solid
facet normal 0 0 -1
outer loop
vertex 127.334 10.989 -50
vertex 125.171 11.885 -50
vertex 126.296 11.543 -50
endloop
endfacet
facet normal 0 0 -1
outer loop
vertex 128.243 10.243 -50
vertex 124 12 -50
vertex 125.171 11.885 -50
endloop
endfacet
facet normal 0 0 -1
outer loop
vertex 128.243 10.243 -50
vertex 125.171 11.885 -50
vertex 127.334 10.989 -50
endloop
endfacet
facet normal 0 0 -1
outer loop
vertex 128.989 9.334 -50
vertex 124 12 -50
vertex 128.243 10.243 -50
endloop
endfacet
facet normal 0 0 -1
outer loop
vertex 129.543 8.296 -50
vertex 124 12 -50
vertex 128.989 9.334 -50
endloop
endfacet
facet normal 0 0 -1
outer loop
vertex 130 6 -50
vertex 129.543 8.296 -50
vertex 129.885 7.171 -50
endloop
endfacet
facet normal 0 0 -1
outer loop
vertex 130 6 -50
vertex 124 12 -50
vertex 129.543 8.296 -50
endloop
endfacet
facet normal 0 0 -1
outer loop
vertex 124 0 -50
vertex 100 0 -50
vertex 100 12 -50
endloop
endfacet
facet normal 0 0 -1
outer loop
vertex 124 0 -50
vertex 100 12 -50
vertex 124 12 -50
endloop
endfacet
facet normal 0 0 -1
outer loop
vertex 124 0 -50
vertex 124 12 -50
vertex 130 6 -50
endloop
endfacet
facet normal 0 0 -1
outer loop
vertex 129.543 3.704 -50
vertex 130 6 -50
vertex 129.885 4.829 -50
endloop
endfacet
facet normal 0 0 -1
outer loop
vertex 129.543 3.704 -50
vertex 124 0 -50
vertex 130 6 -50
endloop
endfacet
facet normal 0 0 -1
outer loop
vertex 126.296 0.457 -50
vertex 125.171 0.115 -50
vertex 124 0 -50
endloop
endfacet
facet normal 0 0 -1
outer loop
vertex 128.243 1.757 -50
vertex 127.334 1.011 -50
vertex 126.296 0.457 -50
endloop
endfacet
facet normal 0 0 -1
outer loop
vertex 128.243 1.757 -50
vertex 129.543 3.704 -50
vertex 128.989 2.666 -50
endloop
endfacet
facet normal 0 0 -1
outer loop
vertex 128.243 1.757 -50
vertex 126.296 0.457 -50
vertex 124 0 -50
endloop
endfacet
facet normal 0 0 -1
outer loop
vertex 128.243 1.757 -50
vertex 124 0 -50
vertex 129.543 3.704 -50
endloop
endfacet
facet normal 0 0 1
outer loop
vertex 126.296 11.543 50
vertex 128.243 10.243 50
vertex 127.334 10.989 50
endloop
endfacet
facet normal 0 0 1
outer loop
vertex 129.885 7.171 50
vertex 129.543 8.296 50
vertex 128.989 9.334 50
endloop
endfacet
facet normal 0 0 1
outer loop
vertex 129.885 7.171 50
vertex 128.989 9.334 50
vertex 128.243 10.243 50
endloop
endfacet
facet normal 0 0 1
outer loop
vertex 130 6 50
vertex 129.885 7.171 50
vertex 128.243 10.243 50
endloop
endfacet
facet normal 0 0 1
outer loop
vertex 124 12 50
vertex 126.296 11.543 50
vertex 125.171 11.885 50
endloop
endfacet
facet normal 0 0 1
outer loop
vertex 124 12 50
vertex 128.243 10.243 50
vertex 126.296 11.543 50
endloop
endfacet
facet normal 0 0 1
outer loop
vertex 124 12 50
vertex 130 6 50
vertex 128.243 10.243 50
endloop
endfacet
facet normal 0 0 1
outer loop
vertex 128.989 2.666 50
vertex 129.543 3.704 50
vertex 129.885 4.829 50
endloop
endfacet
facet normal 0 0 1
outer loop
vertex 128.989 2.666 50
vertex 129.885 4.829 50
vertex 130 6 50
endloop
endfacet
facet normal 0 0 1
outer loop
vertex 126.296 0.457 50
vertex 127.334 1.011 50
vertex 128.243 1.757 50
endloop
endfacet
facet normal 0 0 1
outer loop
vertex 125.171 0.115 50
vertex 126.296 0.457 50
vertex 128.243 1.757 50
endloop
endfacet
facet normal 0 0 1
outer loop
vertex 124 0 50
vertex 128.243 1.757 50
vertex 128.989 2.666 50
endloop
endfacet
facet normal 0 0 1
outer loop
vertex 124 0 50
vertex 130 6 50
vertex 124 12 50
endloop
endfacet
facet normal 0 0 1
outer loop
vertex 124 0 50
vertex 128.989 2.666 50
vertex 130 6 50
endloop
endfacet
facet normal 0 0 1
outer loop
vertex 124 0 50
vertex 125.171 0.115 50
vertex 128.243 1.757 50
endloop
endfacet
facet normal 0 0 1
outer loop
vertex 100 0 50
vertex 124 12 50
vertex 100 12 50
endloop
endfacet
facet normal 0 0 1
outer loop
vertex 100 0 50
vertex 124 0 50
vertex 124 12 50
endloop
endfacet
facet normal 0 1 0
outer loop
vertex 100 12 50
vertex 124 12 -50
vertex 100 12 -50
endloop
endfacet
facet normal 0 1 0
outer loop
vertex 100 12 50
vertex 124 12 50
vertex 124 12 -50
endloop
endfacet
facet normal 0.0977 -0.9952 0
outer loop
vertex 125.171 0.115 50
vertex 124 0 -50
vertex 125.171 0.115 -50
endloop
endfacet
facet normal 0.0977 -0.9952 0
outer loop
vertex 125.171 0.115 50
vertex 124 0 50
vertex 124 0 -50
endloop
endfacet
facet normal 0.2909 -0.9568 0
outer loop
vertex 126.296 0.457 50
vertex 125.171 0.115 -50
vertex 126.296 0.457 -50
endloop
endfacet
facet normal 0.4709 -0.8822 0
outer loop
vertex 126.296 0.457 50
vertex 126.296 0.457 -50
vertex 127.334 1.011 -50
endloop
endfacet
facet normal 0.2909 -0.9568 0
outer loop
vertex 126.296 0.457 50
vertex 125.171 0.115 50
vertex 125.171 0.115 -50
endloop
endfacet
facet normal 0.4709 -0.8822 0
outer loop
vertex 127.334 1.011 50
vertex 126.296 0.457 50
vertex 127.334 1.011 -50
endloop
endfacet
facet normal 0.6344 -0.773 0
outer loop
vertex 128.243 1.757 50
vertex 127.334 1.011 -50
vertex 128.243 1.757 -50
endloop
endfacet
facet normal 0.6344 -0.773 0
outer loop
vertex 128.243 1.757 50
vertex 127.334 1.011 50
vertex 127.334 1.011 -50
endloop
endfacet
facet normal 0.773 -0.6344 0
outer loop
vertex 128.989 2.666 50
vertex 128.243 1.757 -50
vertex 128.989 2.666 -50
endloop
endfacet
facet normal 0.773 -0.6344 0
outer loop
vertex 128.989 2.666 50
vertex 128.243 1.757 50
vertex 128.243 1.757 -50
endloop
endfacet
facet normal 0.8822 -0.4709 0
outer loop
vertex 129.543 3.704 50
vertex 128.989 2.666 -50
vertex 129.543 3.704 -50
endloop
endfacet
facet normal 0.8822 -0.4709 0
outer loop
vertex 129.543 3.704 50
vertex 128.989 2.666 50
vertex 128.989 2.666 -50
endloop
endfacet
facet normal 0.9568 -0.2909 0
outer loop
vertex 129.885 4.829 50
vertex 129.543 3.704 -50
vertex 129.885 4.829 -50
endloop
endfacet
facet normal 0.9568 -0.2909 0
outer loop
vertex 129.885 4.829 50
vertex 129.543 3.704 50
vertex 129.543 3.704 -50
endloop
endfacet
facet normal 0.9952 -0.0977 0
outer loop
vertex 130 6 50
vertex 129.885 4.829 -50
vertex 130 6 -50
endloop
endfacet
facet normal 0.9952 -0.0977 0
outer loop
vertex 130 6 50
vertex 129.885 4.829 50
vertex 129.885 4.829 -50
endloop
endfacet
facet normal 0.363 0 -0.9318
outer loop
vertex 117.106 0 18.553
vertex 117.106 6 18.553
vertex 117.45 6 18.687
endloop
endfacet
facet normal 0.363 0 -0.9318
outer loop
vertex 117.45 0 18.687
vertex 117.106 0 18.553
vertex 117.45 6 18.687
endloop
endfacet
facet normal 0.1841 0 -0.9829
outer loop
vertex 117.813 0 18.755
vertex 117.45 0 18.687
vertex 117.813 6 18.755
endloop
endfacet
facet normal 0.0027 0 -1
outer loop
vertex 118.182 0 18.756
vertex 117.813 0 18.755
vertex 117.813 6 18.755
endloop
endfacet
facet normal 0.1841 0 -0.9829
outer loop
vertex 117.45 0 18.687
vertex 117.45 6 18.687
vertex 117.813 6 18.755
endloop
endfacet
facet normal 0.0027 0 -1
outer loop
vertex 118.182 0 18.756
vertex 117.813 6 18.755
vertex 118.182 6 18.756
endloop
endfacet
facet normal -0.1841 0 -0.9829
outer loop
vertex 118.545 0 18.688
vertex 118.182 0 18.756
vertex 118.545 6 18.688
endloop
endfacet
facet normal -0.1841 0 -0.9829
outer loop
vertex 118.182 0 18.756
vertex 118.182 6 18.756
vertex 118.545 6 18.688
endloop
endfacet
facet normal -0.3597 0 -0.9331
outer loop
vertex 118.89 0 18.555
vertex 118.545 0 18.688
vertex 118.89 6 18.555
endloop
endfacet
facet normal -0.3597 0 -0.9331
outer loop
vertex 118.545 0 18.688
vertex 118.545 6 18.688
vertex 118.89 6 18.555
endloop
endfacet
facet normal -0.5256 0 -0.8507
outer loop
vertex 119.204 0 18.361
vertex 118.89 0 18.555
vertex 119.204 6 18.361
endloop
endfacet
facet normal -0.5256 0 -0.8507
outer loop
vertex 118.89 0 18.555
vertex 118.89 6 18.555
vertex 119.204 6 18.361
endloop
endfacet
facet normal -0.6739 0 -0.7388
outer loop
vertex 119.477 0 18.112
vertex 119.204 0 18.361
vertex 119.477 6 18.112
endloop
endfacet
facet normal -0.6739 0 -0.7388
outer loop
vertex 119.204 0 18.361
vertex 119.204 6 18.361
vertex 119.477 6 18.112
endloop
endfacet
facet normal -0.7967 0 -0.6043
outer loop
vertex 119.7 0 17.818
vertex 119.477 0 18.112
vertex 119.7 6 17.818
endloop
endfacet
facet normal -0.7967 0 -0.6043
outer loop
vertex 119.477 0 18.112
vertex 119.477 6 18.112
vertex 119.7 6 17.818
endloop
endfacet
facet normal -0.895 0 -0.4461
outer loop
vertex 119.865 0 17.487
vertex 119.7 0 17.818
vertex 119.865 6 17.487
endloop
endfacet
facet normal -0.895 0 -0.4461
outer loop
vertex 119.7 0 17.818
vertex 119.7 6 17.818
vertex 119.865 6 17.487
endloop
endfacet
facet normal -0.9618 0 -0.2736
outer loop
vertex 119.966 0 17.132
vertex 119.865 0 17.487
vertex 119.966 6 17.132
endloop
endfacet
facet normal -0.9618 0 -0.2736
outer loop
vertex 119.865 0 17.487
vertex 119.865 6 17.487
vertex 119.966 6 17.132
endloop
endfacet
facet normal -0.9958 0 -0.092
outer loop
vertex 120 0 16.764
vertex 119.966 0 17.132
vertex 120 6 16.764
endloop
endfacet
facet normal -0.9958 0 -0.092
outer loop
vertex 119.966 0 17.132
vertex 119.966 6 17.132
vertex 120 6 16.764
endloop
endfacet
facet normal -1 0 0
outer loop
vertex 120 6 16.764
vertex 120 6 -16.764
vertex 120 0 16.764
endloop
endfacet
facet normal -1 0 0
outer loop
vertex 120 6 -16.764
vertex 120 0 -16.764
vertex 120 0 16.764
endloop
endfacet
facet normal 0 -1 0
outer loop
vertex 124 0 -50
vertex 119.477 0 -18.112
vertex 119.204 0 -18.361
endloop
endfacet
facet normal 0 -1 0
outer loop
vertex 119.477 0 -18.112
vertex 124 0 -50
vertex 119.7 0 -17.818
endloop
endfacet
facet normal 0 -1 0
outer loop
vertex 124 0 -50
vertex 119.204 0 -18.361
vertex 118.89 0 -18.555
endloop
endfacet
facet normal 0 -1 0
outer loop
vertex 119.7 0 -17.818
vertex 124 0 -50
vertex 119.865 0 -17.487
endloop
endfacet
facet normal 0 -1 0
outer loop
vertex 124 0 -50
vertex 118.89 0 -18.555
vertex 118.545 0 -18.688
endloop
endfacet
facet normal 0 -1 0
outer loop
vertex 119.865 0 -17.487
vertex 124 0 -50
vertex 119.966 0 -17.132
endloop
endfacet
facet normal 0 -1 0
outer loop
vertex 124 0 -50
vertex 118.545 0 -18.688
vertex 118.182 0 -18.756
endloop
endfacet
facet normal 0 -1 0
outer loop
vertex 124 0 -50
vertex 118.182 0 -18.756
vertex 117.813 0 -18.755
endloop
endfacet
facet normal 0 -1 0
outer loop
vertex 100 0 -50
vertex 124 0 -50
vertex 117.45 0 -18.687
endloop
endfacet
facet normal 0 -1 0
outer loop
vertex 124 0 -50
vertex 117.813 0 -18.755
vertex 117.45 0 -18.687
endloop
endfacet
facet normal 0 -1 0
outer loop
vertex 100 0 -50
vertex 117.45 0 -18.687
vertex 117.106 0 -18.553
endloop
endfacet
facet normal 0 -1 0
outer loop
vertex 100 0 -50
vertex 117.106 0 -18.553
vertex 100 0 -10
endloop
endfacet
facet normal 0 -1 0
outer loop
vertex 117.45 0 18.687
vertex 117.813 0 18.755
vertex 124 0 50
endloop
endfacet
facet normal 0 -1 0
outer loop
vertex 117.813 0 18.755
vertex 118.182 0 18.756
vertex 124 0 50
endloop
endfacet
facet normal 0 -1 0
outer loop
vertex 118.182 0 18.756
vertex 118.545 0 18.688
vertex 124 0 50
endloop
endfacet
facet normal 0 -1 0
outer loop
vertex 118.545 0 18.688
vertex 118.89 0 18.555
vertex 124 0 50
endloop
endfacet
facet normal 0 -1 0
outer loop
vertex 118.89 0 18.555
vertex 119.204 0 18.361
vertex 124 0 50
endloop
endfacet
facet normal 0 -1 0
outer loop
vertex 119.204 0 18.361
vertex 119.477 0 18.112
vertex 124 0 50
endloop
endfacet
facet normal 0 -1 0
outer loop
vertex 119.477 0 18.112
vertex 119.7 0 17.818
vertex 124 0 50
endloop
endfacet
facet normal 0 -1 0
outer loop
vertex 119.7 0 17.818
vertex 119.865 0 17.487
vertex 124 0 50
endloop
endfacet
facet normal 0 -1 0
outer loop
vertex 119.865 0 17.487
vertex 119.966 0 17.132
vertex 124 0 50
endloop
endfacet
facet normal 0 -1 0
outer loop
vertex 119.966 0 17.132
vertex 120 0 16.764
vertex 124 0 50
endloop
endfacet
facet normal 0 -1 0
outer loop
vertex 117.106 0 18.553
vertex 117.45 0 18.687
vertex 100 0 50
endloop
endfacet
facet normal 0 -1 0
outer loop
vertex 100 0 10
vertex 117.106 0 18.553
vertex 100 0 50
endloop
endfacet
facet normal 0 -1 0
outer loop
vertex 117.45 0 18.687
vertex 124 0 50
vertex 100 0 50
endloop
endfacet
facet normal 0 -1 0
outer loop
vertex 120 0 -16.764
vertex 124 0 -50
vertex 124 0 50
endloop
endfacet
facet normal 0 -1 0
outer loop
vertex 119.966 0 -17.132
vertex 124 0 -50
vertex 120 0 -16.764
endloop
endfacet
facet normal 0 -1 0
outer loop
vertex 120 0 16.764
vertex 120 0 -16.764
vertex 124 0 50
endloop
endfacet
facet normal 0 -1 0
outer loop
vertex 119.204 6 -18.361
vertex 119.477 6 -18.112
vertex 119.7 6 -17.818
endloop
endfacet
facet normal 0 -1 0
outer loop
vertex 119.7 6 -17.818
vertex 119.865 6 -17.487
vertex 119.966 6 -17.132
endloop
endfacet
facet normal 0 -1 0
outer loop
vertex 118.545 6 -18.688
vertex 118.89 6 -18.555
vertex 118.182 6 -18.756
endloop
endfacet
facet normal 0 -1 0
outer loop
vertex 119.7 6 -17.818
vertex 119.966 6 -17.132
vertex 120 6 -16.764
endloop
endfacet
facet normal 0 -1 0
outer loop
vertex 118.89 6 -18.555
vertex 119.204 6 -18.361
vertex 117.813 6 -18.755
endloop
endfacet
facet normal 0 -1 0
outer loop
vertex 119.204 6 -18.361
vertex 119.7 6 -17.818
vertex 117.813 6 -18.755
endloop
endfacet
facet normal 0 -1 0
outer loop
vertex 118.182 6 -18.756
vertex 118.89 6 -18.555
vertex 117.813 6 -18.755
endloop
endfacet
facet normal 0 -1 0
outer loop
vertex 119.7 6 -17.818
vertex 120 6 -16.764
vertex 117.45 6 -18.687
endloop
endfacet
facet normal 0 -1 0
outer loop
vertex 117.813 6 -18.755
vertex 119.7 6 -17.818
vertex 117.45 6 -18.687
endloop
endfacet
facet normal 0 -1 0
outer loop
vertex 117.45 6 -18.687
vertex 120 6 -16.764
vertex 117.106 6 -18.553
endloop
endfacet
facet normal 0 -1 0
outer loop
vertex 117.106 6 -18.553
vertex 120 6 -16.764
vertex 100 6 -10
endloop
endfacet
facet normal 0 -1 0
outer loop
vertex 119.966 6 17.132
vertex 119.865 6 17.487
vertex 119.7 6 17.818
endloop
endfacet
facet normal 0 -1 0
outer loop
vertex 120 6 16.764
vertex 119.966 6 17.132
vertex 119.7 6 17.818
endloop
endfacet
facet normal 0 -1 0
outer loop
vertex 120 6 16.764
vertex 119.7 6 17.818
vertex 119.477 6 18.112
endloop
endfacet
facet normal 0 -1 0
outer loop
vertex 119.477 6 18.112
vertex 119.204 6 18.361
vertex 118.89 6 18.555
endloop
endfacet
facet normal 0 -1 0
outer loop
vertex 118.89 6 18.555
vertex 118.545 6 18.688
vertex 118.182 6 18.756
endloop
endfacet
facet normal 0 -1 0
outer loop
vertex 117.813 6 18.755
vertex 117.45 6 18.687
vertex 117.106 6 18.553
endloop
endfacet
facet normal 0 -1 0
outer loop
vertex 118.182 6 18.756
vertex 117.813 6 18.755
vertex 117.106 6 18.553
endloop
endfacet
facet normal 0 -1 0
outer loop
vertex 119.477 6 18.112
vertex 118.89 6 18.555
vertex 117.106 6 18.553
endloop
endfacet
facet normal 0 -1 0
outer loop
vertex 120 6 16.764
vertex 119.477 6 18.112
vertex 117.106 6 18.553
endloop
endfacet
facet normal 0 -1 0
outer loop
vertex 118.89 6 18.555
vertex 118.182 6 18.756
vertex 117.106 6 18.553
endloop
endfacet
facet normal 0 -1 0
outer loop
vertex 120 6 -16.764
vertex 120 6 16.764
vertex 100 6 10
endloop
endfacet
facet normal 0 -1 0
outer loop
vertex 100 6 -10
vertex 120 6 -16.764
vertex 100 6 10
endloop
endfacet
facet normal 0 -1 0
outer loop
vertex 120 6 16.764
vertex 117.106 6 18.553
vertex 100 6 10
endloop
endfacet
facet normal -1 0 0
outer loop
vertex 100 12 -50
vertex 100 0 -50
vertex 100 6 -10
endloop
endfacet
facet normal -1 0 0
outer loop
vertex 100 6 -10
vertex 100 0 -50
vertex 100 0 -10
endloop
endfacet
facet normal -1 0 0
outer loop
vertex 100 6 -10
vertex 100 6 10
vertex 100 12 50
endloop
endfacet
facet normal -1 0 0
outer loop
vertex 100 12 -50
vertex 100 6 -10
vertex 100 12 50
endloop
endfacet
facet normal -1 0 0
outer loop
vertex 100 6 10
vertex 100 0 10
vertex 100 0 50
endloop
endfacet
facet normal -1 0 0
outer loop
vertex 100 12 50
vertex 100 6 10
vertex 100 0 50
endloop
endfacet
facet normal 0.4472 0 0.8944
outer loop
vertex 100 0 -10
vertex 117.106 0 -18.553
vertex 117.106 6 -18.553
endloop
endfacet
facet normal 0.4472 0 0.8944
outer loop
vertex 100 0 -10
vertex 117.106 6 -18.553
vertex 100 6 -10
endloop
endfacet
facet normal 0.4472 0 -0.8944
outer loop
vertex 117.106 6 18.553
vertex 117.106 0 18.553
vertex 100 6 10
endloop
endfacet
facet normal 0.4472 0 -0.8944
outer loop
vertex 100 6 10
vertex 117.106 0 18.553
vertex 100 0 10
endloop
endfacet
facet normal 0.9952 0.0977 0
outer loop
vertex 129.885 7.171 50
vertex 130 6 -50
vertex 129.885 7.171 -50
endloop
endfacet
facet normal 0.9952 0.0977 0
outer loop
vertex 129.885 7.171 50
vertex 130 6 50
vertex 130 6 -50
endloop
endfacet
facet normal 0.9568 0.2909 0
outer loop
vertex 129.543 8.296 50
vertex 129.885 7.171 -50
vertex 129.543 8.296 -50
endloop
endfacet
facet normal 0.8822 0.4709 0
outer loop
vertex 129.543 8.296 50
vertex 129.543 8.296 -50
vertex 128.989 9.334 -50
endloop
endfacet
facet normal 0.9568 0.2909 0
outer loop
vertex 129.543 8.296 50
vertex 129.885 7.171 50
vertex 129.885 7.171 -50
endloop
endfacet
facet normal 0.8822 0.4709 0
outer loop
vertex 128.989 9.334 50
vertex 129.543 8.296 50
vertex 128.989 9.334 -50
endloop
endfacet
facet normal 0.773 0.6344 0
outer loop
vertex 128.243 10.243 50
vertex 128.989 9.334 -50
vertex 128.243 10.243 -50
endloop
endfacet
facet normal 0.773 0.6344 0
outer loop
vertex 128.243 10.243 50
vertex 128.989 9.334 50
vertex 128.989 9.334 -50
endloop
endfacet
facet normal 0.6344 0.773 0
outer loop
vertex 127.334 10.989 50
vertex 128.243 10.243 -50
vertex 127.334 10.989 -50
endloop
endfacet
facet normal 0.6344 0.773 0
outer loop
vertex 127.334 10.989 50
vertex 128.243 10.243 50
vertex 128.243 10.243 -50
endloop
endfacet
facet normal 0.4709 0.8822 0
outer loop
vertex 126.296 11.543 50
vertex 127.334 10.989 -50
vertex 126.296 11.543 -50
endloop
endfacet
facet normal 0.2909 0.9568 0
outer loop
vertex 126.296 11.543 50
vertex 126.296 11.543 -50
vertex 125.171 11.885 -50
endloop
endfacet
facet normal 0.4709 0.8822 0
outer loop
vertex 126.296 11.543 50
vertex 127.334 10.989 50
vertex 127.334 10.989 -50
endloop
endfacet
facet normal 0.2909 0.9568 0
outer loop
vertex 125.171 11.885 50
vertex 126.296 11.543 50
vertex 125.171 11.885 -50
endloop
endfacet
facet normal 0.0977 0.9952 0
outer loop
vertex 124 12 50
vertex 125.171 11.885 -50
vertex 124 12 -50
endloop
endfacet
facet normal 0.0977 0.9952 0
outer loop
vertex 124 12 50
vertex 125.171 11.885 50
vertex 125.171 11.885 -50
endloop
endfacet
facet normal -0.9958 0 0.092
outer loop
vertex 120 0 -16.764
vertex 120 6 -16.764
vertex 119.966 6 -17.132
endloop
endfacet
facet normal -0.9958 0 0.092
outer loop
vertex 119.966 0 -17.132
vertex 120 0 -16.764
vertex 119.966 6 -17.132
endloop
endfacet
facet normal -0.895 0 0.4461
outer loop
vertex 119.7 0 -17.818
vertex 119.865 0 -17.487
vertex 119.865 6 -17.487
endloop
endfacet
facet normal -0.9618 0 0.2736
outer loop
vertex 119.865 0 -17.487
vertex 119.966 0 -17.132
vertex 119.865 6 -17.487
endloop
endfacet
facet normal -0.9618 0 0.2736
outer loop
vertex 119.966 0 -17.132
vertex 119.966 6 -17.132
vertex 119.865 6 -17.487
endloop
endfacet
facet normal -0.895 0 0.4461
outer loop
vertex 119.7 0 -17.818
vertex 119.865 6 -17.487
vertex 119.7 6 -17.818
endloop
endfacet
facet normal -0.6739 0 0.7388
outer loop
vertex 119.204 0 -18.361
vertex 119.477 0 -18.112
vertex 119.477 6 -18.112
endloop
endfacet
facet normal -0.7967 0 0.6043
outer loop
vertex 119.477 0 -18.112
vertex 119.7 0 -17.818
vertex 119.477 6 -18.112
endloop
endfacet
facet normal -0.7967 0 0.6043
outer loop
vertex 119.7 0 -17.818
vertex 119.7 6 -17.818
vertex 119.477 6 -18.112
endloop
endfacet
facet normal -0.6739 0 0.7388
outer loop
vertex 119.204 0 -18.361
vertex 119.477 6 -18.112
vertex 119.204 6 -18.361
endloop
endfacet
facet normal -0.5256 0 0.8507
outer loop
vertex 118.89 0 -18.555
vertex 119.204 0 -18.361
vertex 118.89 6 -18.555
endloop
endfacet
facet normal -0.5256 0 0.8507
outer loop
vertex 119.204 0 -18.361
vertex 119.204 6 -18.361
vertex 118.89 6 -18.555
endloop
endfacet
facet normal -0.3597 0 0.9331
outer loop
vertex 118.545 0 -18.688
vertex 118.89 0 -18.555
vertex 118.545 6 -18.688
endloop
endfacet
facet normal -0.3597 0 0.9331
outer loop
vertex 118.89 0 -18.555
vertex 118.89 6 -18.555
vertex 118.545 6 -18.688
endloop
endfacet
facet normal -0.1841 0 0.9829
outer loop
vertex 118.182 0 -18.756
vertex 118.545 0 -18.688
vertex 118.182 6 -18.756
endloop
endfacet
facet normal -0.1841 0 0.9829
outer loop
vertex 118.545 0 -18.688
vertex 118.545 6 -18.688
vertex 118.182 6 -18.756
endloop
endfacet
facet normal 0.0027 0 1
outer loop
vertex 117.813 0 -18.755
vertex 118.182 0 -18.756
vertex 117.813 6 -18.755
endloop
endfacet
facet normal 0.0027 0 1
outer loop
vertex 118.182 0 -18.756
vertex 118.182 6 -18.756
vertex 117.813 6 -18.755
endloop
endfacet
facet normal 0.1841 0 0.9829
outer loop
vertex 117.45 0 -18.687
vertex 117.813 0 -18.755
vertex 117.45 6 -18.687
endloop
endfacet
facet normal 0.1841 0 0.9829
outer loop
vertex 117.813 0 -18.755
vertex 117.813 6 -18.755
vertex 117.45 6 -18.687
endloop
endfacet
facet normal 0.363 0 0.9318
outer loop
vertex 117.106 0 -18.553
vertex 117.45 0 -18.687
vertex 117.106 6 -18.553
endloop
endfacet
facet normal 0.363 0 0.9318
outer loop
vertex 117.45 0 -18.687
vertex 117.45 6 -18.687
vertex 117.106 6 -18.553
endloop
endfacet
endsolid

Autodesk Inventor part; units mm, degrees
ref_plane "YZ Plane" through (0, 0, 0) normal (1, 0, 0) x (0, 1, 0)
ref_plane "XZ Plane" through (0, 0, 0) normal (0, 1, 0) x (-1, 0, 0)
ref_plane "XY Plane" through (0, 0, 0) normal (0, 0, 1) x (1, 0, 0)
sketch "Sketch1" plane through (0, 0, 0) normal (0, 1, 0) x (-1, 0, 0)
  line L0 (100, -50) -> (-100, -50)
  line L1 (-100, -50) -> (-100, 50)
  line L2 (-100, 50) -> (100, 50)
  line L3 (100, 50) -> (100, -50)
  line L4 (100, -50) -> (-100, 50) construction
  line L5 (-100, -50) -> (100, 50) construction
  line L6 (-40, -30) -> (-80, -30)
  line L7 (-50, -50) -> (-70, -50)
  line L8 (-40, -30) -> (-50, -50)
  line L9 (-80, -30) -> (-70, -50)
  line L10 (80, -30) -> (40, -30)
  line L11 (70, -50) -> (50, -50)
  line L12 (80, -30) -> (70, -50)
  line L13 (40, -30) -> (50, -50)
  line L14 (-100, -10) -> (-100, 10)
  line L15 (-80, -20) -> (-80, 20)
  line L16 (-80, -20) -> (-100, -10)
  line L17 (-80, 20) -> (-100, 10)
  line L18 (100, -50) -> (-100, -50)
  line L19 (-100, -50) -> (-130, -50)
  line L20 (-130, -50) -> (-130, 50)
  line L21 (-130, 50) -> (-100, 50)
  line L22 (-100, 50) -> (-100, -50)
  line L23 (-120, -20) -> (-120, 20)
  line L24 (-120, -20) -> (-100, -10)
  line L25 (-120, 20) -> (-100, 10)
  point P0 (0, 0)
  point P1 (-100, 10)
  point P2 (-100, -10)
  point P3 (-70, -50)
  point P4 (-50, -50)
  point P5 (70, -50)
  point P6 (0, 0)
  point P7 (0, 0)
  point P8 (-100, -50)
  dimension "d72" = 200
  dimension "d73" = 100
  dimension "d78" = 20
  dimension "d79" = 40
  dimension "d80" = 20
  dimension "d81" = 10
  dimension "d82" = 20
  dimension "d83" = 40
  dimension "d84" = 20
  dimension "d85" = 10
  dimension "d86" = 120
  dimension "d87" = 30
  dimension "d88" = 0
  dimension "d89" = 0
  dimension "d90" = 40
  dimension "d91" = 20
  dimension "d92" = 20
  dimension "d93" = 10
  dimension "d94" = 40
  dimension "d95" = 0
  dimension "d122" = 30
extrude "Extrusion24" add sketch "Sketch1" along normal blind 12 contours L1 L25 L23 L24 L19 L20 L21 | L1 L24 L23 L25
extrude "Extrusion25" cut sketch "Sketch1" along normal blind 6 contours L1 L24 L23 L25
fillet "Fillet11" radius 2 2 edges at (120, 3, 20) (120, 3, -20)
fillet "Fillet12" radius 6 2 edges at (130, 0, 0) (130, 12, 0)
properties part number "Test2_3DPrint"
